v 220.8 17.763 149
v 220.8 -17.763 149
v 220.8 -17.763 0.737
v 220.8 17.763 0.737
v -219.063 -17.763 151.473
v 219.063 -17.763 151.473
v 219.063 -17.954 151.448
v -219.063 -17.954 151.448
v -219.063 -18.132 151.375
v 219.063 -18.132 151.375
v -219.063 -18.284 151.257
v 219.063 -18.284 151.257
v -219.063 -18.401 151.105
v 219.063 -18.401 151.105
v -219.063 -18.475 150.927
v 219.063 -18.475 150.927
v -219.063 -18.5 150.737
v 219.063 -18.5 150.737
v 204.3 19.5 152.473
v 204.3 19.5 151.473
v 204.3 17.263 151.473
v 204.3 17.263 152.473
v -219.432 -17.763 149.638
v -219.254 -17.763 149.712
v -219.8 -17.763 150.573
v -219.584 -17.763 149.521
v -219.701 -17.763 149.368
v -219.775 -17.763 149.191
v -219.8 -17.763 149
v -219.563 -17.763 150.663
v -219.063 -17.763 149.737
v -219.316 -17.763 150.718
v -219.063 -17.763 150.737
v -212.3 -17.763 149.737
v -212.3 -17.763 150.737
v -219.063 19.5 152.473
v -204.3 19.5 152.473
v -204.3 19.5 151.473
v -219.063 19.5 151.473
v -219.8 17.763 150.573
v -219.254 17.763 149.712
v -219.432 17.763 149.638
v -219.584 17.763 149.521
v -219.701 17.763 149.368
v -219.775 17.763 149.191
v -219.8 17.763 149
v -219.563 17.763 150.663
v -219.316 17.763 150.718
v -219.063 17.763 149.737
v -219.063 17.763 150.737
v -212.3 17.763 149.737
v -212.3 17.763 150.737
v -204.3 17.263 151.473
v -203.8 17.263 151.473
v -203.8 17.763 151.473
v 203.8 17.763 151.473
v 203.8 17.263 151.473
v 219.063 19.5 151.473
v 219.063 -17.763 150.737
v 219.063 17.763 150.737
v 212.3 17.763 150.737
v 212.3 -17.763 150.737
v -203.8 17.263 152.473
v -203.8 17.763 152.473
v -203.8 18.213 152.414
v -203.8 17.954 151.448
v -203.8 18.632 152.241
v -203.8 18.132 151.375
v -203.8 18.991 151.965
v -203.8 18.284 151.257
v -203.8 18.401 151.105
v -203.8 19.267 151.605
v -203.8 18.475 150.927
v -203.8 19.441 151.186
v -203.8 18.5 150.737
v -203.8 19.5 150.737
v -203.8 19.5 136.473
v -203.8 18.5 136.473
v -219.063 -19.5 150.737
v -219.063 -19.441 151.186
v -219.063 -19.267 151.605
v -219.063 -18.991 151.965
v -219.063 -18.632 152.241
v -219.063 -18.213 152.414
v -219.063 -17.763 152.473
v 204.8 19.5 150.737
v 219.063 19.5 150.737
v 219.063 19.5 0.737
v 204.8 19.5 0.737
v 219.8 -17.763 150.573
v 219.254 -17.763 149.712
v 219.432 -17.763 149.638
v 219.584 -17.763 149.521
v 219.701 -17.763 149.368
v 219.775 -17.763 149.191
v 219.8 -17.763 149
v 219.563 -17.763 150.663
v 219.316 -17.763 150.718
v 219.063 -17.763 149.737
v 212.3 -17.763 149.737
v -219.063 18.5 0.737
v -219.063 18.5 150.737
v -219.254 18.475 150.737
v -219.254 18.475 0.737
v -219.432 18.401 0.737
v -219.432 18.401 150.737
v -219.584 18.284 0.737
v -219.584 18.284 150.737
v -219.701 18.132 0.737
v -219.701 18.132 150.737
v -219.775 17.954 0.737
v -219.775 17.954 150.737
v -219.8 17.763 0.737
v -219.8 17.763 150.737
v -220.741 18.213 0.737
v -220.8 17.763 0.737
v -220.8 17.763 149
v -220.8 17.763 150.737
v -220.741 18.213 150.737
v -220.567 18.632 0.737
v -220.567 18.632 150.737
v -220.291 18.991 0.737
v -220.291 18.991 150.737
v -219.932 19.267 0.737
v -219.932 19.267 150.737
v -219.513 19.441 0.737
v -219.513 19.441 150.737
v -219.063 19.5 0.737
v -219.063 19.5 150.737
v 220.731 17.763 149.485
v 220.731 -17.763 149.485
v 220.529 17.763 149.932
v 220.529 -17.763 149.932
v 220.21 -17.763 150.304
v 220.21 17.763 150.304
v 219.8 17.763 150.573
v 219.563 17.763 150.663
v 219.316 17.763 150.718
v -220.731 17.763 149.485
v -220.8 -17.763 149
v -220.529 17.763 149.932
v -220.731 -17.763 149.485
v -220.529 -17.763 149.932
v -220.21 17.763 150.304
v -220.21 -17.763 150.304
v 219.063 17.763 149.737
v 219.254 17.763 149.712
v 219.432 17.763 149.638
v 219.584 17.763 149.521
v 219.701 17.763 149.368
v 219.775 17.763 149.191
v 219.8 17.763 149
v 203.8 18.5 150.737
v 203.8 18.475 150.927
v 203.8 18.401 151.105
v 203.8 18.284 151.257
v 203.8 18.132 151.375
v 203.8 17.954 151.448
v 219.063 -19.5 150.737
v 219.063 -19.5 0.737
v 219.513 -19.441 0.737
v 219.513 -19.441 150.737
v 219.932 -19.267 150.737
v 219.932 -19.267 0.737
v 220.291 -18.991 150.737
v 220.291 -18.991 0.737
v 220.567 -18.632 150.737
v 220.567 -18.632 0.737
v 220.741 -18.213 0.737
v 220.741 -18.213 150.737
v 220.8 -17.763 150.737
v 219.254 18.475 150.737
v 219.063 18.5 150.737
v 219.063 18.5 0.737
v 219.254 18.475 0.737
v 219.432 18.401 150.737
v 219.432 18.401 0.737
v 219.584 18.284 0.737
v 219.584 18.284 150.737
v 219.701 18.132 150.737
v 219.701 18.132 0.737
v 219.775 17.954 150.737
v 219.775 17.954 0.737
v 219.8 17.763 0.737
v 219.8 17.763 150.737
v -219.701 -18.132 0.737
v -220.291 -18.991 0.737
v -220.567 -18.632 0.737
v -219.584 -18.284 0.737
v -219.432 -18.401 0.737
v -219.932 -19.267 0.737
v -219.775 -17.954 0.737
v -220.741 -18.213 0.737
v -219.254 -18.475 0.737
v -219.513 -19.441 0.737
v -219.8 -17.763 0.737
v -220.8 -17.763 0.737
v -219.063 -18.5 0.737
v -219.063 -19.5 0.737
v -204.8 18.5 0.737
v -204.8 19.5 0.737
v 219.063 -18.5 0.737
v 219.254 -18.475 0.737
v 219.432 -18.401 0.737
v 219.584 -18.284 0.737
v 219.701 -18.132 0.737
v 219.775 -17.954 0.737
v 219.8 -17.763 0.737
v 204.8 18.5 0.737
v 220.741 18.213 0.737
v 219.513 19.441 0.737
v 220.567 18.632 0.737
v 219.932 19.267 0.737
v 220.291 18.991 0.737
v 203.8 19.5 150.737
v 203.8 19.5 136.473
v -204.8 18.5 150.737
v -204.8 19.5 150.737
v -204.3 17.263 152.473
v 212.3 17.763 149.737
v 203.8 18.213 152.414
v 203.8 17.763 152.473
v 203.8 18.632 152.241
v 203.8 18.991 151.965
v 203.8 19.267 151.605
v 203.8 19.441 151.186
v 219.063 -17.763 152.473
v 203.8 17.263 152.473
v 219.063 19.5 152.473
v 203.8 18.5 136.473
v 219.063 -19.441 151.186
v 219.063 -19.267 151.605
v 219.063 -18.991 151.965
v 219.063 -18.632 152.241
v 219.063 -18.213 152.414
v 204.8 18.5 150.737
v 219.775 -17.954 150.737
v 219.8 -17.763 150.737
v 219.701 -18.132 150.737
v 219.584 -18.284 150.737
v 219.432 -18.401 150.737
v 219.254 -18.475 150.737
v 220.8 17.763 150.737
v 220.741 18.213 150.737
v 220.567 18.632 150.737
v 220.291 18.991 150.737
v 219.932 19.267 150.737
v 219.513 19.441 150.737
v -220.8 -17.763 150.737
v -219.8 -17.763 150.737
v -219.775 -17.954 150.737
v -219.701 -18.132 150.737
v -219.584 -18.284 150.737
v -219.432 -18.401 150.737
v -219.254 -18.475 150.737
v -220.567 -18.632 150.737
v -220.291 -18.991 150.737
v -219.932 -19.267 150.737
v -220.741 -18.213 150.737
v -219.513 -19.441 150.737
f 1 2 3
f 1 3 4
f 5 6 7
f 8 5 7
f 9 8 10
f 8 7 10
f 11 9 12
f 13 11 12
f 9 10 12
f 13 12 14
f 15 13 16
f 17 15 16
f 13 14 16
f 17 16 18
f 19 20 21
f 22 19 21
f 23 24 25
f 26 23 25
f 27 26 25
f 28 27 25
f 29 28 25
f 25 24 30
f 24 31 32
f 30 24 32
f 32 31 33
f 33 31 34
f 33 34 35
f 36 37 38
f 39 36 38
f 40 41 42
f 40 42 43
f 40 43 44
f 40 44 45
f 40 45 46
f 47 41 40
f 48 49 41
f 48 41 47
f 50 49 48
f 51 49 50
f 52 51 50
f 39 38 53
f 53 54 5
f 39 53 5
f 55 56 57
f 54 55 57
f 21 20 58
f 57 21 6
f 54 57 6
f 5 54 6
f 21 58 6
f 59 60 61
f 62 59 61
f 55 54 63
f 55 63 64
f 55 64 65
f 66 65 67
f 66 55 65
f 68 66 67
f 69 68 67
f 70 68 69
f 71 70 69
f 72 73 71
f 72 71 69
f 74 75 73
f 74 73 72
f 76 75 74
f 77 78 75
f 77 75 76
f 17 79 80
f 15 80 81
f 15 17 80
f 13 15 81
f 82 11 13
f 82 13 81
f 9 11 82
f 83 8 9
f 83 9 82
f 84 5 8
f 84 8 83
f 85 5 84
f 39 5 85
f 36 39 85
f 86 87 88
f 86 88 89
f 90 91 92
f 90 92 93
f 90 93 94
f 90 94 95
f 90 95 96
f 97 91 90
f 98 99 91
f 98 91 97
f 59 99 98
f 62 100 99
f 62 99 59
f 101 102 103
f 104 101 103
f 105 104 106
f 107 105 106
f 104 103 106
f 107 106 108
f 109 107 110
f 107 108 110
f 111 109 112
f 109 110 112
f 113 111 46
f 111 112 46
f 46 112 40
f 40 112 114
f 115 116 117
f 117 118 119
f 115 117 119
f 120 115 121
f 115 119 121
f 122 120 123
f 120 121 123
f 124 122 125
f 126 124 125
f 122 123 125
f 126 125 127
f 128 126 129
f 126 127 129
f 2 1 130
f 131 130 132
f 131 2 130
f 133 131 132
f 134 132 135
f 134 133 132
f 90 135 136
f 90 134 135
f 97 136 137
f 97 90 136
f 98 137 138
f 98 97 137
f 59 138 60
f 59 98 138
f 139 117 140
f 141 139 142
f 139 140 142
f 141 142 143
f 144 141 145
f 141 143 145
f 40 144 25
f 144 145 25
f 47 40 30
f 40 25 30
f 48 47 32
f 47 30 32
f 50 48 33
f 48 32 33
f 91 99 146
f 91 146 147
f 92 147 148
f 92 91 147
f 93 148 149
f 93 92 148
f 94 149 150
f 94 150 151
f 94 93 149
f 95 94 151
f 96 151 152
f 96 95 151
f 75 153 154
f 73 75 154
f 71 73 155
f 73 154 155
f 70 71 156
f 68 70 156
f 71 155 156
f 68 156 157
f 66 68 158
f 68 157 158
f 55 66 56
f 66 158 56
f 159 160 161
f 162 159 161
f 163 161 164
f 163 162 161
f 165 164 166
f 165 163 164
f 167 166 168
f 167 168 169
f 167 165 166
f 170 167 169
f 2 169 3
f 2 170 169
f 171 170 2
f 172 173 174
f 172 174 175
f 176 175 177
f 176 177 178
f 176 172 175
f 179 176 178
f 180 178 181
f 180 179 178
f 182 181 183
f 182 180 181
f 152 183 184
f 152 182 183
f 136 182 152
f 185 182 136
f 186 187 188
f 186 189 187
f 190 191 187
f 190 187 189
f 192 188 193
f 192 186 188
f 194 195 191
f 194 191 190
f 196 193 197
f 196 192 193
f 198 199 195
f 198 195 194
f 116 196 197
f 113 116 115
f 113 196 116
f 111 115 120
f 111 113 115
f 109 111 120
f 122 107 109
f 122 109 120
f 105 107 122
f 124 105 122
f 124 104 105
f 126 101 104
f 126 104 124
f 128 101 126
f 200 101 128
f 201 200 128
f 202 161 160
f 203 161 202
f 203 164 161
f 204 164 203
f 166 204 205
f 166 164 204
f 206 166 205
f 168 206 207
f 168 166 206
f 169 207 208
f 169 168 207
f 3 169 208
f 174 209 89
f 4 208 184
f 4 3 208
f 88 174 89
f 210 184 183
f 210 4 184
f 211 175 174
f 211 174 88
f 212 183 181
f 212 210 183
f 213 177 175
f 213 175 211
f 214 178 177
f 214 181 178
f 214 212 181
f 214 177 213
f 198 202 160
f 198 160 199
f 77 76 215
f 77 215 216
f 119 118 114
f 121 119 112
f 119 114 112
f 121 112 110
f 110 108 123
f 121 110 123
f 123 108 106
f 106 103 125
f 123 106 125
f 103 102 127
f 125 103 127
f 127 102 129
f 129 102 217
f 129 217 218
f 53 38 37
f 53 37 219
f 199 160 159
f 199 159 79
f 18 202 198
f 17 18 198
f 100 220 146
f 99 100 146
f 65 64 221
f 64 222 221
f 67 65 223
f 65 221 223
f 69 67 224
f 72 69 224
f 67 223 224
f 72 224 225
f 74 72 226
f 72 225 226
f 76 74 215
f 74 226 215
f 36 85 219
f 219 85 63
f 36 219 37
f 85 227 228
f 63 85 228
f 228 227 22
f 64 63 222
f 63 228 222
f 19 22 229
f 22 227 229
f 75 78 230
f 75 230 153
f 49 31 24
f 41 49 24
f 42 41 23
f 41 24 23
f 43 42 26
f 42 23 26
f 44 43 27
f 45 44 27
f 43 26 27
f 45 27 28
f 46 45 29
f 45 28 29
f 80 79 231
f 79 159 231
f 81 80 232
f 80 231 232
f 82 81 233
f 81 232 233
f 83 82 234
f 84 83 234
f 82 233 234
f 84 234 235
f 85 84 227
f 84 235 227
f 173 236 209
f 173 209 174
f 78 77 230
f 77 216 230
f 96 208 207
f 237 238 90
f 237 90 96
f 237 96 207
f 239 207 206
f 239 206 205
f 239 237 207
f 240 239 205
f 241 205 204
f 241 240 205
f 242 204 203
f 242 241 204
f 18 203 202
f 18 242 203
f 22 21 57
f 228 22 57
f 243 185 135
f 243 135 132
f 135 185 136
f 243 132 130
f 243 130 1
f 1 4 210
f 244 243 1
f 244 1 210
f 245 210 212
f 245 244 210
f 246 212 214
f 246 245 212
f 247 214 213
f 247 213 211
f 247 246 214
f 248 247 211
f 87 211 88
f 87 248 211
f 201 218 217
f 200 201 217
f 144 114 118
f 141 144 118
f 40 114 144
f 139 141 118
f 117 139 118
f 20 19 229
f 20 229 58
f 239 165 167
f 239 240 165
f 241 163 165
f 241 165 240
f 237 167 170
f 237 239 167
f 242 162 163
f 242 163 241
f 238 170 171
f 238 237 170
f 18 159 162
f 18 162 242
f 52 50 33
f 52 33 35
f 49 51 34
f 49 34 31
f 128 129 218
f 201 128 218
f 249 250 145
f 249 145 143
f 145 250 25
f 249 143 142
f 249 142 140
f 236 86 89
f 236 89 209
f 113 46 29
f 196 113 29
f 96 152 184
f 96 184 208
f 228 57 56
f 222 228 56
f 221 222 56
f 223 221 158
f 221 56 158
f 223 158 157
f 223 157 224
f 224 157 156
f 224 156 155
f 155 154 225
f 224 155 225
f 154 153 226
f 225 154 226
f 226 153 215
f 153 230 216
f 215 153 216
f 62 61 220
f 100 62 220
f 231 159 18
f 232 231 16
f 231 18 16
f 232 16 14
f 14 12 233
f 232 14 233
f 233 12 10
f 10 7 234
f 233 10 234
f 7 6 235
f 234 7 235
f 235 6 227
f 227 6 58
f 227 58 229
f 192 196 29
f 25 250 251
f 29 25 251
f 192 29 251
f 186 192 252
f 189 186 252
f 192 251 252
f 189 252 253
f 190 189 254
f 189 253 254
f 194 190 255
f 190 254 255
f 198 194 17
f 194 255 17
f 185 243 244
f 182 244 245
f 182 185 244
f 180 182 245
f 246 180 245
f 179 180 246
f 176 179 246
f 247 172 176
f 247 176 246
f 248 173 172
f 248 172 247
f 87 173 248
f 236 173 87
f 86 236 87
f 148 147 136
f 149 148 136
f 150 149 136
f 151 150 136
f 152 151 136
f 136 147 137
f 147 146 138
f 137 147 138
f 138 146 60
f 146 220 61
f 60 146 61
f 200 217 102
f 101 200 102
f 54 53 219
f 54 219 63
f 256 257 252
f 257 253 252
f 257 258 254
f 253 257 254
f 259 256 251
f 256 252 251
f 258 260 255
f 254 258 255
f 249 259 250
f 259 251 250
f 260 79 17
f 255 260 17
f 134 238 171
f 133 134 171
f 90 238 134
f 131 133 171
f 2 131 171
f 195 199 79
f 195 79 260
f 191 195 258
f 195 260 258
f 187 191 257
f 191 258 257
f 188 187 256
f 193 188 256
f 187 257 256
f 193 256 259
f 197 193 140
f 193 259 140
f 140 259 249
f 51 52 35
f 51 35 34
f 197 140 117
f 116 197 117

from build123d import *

# Parameters (mm, degrees)
SKETCH71_W                              = 220.8
SKETCH71_H                              = 150
BASE_FLANGE_DEPTH                       = 1
EDGE_FLANGE_SIDE_STRIP_W                = 5.4732
EDGE_FLANGE_SIDE_STRIP_H                = 1
EDGE_FLANGE_SIDE_STRIP_CUT_DEPTH        = 150
EDGE_FLANGE_SIDE_DEPTH                  = 150
EDGE_FLANGE_SIDE_TOP_STRIP_W            = 5.4732
EDGE_FLANGE_SIDE_TOP_STRIP_H            = 1
EDGE_FLANGE_SIDE_TOP_STRIP_CUT_DEPTH    = 150
EDGE_FLANGE_SIDE_TOP_DEPTH              = 150
EDGE_FLANGE_BOTTOM_DEPTH                = 219.0634
EDGE_FLANGE_BOTTOM_TOP_STRIP_W          = 5.4732
EDGE_FLANGE_BOTTOM_TOP_STRIP_H          = 1
EDGE_FLANGE_BOTTOM_TOP_STRIP_CUT_DEPTH  = 203.8
EDGE_FLANGE_BOTTOM_TOP_RELIEF_W         = 5.9732
EDGE_FLANGE_BOTTOM_TOP_RELIEF_H         = 0.5
EDGE_FLANGE_BOTTOM_TOP_RELIEF_CUT_DEPTH = 1
EDGE_FLANGE_BOTTOM_TOP_DEPTH            = 203.8
EDGE_FLANGE_SIDE_BOTTOM_STRIP_W         = 5.4732
EDGE_FLANGE_SIDE_BOTTOM_STRIP_H         = 1
EDGE_FLANGE_SIDE_BOTTOM_STRIP_CUT_DEPTH = 35.5268
EDGE_FLANGE_SIDE_BOTTOM_DEPTH           = 35.5268


# Sheet-metal steps are written as plain solids
with BuildPart() as part:
    # Sketch71 → Base-Flange (new body)
    with BuildSketch(Plane(origin=(0, -19.5, 0), x_dir=(1, 0, 0), z_dir=(0, 1, 0))):
        with Locations((110.4, -75.7366)):
            Rectangle(SKETCH71_W, SKETCH71_H)
    extrude(amount=BASE_FLANGE_DEPTH)

    # Edge-Flange-Side strip (across the edge) → Edge-Flange-Side strip cut (cut)
    with BuildSketch(Plane(origin=(220.8, -18.5, 150.7366), x_dir=(-1, 0, 0), z_dir=(0, 0, -1))):
        with Locations((-1, -0.5)):
            Rectangle(EDGE_FLANGE_SIDE_STRIP_W, EDGE_FLANGE_SIDE_STRIP_H)
    extrude(amount=EDGE_FLANGE_SIDE_STRIP_CUT_DEPTH, mode=Mode.SUBTRACT)

    # Edge-Flange-Side section (across the edge) → Edge-Flange-Side (add)
    with BuildSketch(Plane(origin=(220.8, -18.5, 150.7366), x_dir=(-1, 0, 0), z_dir=(0, 0, -1))):
        with BuildLine():
            Line((0, 0.7366), (0, 38))
            Line((0, 38), (1, 38))
            Line((1, 38), (1, 0.7366))
            ThreePointArc((1, 0.7366), (1.215745145, 0.215745145), (1.7366, 0))
            Line((1.7366, 0), (1.7366, -1))
            ThreePointArc((1.7366, -1), (0.508638364, -0.491361636), (0, 0.7366))
        make_face()
    extrude(amount=EDGE_FLANGE_SIDE_DEPTH)

    # Edge-Flange-Side-Top strip (across the edge) → Edge-Flange-Side-Top strip cut (cut)
    with BuildSketch(Plane(origin=(219.8, 19.5, 150.7366), x_dir=(0, -1, 0), z_dir=(0, 0, -1))):
        with Locations((-1, -0.5)):
            Rectangle(EDGE_FLANGE_SIDE_TOP_STRIP_W, EDGE_FLANGE_SIDE_TOP_STRIP_H)
    extrude(amount=EDGE_FLANGE_SIDE_TOP_STRIP_CUT_DEPTH, mode=Mode.SUBTRACT)

    # Edge-Flange-Side-Top section (across the edge) → Edge-Flange-Side-Top (add)
    with BuildSketch(Plane(origin=(219.8, 19.5, 150.7366), x_dir=(0, -1, 0), z_dir=(0, 0, -1))):
        with BuildLine():
            Line((0, 0.7366), (0, 15))
            Line((0, 15), (1, 15))
            Line((1, 15), (1, 0.7366))
            ThreePointArc((1, 0.7366), (1.215745145, 0.215745145), (1.7366, 0))
            Line((1.7366, 0), (1.7366, -1))
            ThreePointArc((1.7366, -1), (0.508638364, -0.491361636), (0, 0.7366))
        make_face()
    extrude(amount=EDGE_FLANGE_SIDE_TOP_DEPTH)

    # Edge-Flange-Bottom section (across the edge) → Edge-Flange-Bottom (add)
    with BuildSketch(Plane(origin=(0, -18.5, 151.4732), x_dir=(0, 0, -1), z_dir=(1, 0, 0))):
        with BuildLine():
            Line((-1, 0.7366), (-1, 38))
            Line((-1, 38), (0, 38))
            Line((0, 38), (0, 0.7366))
            ThreePointArc((0, 0.7366), (0.215745145, 0.215745145), (0.7366, 0))
            Line((0.7366, 0), (0.7366, -1))
            ThreePointArc((0.7366, -1), (-0.491361636, -0.491361636), (-1, 0.7366))
        make_face()
    extrude(amount=EDGE_FLANGE_BOTTOM_DEPTH)

    # Edge-Flange-Bottom-Top strip (across the edge) → Edge-Flange-Bottom-Top strip cut (cut)
    with BuildSketch(Plane(origin=(0, 19.5, 151.4732), x_dir=(0, -1, 0), z_dir=(1, 0, 0))):
        with Locations((-1, -0.5)):
            Rectangle(EDGE_FLANGE_BOTTOM_TOP_STRIP_W, EDGE_FLANGE_BOTTOM_TOP_STRIP_H)
    extrude(amount=EDGE_FLANGE_BOTTOM_TOP_STRIP_CUT_DEPTH, mode=Mode.SUBTRACT)

    # Edge-Flange-Bottom-Top relief (on the sheet) → Edge-Flange-Bottom-Top relief cut (cut)
    with BuildSketch(Plane(origin=(0, 17.7634, 151.4732), x_dir=(0, -1, 0), z_dir=(0, 0, -1))):
        with Locations((-2.4866, -204.05)):
            Rectangle(EDGE_FLANGE_BOTTOM_TOP_RELIEF_W, EDGE_FLANGE_BOTTOM_TOP_RELIEF_H)
    extrude(amount=-EDGE_FLANGE_BOTTOM_TOP_RELIEF_CUT_DEPTH, mode=Mode.SUBTRACT)

    # Edge-Flange-Bottom-Top section (across the edge) → Edge-Flange-Bottom-Top (add)
    with BuildSketch(Plane(origin=(0, 19.5, 151.4732), x_dir=(0, -1, 0), z_dir=(1, 0, 0))):
        with BuildLine():
            Line((0, 0.7366), (0, 15))
            Line((0, 15), (1, 15))
            Line((1, 15), (1, 0.7366))
            ThreePointArc((1, 0.7366), (1.215745145, 0.215745145), (1.7366, 0))
            Line((1.7366, 0), (1.7366, -1))
            ThreePointArc((1.7366, -1), (0.508638364, -0.491361636), (0, 0.7366))
        make_face()
    extrude(amount=EDGE_FLANGE_BOTTOM_TOP_DEPTH)

    # Edge-Flange-Side-Bottom strip (across the edge) → Edge-Flange-Side-Bottom strip cut (cut)
    with BuildSketch(Plane(origin=(219.8, -17.7634, 150.7366), x_dir=(0, 0, -1), z_dir=(0, 1, 0))):
        with Locations((-1, -0.5)):
            Rectangle(EDGE_FLANGE_SIDE_BOTTOM_STRIP_W, EDGE_FLANGE_SIDE_BOTTOM_STRIP_H)
    extrude(amount=EDGE_FLANGE_SIDE_BOTTOM_STRIP_CUT_DEPTH, mode=Mode.SUBTRACT)

    # Edge-Flange-Side-Bottom section (across the edge) → Edge-Flange-Side-Bottom (add)
    with BuildSketch(Plane(origin=(219.8, -17.7634, 150.7366), x_dir=(0, 0, -1), z_dir=(0, 1, 0))):
        with BuildLine():
            Line((0, 0.7366), (0, 7.5))
            Line((0, 7.5), (1, 7.5))
            Line((1, 7.5), (1, 0.7366))
            ThreePointArc((1, 0.7366), (1.215745145, 0.215745145), (1.7366, 0))
            Line((1.7366, 0), (1.7366, -1))
            ThreePointArc((1.7366, -1), (0.508638364, -0.491361636), (0, 0.7366))
        make_face()
    extrude(amount=EDGE_FLANGE_SIDE_BOTTOM_DEPTH)

    # Mirror-Vertical: part across plane


with BuildPart() as part_1:
    add(part.part)
    add(part.part.mirror(Plane(origin=(0, -18.5, 0.7366), x_dir=(0, 0, 1), z_dir=(1, 0, 0))))


solid = part_1.part
